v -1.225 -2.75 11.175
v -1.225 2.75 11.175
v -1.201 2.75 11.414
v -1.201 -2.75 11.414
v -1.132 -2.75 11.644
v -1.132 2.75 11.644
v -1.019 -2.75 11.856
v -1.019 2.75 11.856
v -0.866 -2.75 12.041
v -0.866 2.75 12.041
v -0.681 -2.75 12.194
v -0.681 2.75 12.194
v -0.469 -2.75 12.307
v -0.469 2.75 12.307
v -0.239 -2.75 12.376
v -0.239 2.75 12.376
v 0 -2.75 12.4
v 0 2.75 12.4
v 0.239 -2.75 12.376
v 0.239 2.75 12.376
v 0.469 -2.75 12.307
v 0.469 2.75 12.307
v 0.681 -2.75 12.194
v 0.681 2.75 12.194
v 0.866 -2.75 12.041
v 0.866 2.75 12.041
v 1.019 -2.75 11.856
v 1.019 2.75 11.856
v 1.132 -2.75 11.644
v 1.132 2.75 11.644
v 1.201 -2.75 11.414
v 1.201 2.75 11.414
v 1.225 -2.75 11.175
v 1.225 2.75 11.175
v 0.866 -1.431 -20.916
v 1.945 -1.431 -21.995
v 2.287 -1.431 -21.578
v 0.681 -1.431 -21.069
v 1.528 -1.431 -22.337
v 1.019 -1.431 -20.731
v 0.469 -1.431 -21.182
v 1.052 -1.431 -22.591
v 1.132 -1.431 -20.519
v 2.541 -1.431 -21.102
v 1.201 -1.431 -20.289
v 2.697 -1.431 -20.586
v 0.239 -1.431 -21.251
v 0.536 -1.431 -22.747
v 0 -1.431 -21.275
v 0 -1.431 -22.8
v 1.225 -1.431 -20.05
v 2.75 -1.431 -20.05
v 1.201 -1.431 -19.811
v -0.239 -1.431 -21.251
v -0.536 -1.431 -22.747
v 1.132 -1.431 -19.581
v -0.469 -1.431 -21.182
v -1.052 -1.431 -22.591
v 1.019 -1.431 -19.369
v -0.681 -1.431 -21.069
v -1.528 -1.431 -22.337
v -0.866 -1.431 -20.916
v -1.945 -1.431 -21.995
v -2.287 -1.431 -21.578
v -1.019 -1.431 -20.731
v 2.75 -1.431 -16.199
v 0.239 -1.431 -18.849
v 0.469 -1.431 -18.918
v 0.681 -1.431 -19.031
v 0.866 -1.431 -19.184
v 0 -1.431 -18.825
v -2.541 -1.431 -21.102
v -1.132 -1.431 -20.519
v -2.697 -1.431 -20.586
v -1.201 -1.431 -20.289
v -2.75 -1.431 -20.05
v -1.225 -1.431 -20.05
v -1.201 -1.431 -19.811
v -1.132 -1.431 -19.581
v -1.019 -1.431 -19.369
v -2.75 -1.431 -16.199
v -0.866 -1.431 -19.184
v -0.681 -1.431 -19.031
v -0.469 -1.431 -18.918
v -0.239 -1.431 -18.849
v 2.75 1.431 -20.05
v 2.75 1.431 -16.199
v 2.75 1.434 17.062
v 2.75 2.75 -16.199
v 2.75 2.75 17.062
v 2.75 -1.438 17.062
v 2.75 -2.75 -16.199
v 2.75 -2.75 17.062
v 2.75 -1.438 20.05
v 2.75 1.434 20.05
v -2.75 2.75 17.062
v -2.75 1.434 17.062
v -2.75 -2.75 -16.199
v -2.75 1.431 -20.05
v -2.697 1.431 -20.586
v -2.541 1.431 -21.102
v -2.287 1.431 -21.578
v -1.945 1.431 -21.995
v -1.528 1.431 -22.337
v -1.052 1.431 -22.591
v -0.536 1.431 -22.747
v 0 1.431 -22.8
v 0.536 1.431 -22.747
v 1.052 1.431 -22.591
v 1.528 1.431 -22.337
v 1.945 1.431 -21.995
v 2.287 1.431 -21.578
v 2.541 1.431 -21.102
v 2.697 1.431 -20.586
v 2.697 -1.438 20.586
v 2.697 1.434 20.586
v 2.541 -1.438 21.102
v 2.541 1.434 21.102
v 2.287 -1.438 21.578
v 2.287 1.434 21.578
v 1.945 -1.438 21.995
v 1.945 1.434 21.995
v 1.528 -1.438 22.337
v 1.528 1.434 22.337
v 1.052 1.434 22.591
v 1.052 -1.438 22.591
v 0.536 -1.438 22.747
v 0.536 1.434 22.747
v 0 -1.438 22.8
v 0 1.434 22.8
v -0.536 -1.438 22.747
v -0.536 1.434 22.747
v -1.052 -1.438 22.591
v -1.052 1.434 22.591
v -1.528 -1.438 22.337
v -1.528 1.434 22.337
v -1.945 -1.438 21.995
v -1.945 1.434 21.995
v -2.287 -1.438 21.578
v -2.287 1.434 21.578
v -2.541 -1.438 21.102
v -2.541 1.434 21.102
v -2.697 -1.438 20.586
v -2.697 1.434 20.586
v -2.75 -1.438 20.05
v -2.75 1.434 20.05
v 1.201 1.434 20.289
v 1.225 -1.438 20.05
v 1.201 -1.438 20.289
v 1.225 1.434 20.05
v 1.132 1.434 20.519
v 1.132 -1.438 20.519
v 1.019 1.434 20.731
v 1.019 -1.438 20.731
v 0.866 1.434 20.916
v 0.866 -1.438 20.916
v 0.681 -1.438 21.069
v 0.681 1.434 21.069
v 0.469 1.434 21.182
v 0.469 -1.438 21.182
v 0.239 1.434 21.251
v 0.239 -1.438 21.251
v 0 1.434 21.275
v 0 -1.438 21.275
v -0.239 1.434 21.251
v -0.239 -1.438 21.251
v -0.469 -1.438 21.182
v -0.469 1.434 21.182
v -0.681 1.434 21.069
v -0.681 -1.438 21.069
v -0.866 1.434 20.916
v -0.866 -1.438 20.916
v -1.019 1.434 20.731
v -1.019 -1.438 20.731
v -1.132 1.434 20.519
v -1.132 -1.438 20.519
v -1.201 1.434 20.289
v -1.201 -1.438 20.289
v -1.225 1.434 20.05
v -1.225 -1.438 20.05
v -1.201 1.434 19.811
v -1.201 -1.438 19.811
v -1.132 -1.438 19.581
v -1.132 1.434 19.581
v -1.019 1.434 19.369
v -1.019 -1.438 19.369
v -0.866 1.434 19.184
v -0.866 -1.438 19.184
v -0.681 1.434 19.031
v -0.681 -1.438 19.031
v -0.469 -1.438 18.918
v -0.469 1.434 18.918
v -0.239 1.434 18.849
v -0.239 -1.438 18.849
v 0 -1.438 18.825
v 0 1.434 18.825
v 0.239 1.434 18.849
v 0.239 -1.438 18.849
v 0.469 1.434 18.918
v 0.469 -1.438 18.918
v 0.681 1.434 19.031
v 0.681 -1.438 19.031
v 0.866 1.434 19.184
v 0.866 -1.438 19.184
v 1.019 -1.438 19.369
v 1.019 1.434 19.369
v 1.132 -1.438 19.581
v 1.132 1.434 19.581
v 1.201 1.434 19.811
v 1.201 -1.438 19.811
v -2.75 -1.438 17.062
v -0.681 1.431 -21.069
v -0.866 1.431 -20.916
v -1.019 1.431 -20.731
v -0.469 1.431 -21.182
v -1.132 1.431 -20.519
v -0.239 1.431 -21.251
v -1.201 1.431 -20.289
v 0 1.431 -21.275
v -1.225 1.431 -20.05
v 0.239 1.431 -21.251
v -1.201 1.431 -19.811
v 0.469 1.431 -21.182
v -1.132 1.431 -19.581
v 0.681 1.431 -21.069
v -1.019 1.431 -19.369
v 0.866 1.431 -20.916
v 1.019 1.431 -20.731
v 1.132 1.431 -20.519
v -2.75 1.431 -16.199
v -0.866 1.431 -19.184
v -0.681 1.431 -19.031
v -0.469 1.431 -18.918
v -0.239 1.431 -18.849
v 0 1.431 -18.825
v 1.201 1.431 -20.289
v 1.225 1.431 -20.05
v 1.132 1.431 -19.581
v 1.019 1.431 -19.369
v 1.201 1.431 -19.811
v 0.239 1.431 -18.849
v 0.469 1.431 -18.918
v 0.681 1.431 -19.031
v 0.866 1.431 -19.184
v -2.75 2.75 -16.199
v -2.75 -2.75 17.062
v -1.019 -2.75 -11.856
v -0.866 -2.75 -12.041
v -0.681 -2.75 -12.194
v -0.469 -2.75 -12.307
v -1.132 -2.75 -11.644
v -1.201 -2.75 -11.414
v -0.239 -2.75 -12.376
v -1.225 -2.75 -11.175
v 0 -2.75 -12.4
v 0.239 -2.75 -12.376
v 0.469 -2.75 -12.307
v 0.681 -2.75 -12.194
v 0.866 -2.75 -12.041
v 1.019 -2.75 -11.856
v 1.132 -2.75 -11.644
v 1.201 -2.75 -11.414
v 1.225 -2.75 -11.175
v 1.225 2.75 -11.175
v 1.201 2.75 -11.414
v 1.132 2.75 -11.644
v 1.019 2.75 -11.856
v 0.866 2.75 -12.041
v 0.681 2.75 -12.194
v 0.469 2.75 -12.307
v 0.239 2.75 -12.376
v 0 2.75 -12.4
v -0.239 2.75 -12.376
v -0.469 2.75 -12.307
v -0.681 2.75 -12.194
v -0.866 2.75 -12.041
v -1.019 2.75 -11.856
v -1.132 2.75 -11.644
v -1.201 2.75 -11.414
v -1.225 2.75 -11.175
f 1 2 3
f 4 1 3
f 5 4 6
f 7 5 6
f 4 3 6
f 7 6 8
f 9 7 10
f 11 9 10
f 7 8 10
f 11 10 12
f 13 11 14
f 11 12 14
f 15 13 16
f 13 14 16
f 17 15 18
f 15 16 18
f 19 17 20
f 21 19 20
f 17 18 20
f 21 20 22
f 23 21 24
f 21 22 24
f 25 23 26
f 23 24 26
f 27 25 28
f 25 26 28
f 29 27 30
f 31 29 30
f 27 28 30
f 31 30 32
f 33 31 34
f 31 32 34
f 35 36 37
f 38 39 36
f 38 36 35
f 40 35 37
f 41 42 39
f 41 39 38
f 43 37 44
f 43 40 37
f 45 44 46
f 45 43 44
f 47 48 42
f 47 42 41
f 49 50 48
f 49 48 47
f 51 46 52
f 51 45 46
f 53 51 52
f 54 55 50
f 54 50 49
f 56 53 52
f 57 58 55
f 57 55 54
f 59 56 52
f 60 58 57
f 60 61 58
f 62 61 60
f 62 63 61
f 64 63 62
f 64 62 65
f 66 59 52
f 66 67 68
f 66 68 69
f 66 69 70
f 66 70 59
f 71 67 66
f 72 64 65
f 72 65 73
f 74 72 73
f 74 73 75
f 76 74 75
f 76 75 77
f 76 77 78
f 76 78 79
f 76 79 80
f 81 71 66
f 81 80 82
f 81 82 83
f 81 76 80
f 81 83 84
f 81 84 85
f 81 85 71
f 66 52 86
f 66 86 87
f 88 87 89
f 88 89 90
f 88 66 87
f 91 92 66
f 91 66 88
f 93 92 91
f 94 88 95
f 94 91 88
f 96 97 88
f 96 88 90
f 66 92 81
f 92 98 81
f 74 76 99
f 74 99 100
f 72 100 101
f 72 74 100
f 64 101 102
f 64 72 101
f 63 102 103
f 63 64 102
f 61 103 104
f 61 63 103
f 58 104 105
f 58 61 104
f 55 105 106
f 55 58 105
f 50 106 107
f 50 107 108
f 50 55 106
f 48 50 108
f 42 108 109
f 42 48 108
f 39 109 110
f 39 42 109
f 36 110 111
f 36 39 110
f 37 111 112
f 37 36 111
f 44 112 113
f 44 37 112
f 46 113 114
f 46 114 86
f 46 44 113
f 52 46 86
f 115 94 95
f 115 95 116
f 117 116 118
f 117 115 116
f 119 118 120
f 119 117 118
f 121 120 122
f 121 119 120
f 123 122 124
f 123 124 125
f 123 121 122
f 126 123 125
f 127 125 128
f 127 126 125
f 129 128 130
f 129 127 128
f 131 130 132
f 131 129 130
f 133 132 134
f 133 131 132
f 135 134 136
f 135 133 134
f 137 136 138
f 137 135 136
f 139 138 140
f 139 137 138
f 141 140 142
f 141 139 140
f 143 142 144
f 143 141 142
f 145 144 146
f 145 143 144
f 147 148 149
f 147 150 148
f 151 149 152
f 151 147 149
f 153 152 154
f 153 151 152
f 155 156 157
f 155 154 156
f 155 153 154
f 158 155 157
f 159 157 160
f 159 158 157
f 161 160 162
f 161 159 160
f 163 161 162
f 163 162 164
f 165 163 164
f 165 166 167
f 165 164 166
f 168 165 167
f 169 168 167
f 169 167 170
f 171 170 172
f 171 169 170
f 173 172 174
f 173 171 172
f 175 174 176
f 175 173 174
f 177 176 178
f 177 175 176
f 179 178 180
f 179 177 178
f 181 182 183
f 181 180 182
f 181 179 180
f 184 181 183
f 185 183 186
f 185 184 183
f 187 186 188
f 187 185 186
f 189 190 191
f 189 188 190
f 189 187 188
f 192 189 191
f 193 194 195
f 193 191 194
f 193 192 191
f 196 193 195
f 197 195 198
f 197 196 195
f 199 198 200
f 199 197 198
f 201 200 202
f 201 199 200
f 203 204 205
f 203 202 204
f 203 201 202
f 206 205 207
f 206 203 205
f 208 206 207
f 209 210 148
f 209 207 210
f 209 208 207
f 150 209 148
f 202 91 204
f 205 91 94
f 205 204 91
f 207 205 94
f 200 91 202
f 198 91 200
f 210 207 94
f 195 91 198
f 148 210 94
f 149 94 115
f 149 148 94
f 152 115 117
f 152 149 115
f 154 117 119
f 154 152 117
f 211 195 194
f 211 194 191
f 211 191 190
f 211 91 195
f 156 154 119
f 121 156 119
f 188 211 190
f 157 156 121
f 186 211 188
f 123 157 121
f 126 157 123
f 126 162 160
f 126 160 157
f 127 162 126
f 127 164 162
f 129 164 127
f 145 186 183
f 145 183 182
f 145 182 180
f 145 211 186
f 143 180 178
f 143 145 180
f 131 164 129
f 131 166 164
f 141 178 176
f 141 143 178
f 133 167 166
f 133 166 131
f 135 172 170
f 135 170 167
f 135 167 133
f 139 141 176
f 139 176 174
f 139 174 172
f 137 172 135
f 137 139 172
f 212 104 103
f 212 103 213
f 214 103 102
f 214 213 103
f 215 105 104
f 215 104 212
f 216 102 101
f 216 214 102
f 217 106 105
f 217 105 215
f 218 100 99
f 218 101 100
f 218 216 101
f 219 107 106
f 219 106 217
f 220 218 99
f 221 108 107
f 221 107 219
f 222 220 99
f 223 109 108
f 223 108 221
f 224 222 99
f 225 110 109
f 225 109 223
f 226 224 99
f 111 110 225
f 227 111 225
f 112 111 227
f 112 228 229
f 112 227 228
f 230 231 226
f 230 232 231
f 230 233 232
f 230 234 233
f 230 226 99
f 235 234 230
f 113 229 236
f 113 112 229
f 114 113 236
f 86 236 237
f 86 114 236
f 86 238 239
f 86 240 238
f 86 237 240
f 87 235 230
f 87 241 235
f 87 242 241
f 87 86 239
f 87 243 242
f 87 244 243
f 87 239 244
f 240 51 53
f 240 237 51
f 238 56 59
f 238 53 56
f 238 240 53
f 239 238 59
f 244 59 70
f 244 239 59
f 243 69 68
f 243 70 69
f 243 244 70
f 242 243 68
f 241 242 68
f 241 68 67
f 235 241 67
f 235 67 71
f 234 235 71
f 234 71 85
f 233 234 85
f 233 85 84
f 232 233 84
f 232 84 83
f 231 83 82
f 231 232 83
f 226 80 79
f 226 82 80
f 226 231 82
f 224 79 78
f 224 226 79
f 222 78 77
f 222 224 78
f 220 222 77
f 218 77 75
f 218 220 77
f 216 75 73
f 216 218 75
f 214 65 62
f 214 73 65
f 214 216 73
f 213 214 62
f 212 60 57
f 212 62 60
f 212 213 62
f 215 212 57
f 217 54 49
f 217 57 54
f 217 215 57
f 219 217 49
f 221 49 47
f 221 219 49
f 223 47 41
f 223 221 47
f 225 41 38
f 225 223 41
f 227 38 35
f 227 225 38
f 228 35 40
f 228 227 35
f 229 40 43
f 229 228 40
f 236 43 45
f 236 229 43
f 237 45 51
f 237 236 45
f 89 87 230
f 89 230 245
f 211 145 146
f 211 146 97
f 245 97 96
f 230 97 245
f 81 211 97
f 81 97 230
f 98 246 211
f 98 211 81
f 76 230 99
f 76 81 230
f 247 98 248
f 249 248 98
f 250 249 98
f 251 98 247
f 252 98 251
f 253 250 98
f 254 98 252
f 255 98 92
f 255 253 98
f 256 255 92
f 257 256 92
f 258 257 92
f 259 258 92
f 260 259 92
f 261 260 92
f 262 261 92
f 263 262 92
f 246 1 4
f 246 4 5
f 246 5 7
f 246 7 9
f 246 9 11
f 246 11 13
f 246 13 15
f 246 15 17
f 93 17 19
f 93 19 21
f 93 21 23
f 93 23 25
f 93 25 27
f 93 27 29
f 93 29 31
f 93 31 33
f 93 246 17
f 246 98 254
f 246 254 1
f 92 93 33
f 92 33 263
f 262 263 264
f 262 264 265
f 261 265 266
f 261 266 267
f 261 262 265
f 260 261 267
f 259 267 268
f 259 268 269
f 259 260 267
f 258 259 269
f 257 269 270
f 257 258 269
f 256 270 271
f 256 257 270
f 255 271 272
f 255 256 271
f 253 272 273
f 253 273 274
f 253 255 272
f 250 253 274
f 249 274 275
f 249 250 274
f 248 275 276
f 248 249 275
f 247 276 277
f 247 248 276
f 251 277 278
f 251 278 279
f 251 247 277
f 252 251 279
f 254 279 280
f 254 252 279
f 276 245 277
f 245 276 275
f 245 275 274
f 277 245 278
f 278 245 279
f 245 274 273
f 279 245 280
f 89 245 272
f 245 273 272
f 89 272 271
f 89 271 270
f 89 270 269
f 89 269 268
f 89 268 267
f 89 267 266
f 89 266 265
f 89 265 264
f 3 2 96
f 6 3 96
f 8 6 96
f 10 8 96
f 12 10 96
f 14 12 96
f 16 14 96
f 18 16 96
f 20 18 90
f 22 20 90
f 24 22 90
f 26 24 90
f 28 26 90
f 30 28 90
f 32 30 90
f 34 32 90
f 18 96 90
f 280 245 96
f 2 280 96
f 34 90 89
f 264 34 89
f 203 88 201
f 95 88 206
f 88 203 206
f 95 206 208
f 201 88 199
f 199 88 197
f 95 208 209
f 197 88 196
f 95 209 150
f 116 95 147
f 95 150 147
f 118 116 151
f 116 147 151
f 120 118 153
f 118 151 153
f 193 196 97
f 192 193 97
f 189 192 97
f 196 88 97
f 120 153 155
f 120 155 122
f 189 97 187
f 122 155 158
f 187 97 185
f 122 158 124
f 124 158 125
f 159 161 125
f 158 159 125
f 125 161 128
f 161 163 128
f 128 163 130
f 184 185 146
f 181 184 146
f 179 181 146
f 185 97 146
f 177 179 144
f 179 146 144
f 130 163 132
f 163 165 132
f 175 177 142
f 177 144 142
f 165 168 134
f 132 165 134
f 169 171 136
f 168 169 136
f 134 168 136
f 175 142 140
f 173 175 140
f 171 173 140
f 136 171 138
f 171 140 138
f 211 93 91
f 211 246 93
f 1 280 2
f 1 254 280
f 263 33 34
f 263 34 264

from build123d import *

# Parameters (mm, degrees)
F0_R     = 1.225
F1_DEPTH = 2.75
F2_DEPTH = 25
F3_W     = 2.7319499059
F3_H     = 6.5613500774
F3_W_2   = 2.5918500032
F3_W_3   = 2.8168536527
F3_H_2   = 7.1630705833
F3_W_4   = 2.5843745833
F4_DEPTH = 5


with BuildPart() as f1:
    # F0 (on Front) → F1 (new body, symmetric)
    with BuildSketch(Plane.XZ):
        with BuildLine():
            ThreePointArc((-2.75, -20.05), (0, -22.8), (2.75, -20.05))
            Line((2.75, -20.05), (2.75, 20.05))
            ThreePointArc((2.75, 20.05), (0, 22.8), (-2.75, 20.05))
            Line((-2.75, 20.05), (-2.75, -20.05))
        make_face()
        with Locations((0, -20.05)):
            Circle(F0_R, mode=Mode.SUBTRACT)
        with BuildLine():
            Line((-1.225, -11.175), (-1.225, 11.175))
            ThreePointArc((-1.225, 11.175), (0, 12.4), (1.225, 11.175))
            Line((1.225, 11.175), (1.225, -11.175))
            ThreePointArc((1.225, -11.175), (0, -12.4), (-1.225, -11.175))
        make_face(mode=Mode.SUBTRACT)
        with Locations((0, 20.05)):
            Circle(F0_R, mode=Mode.SUBTRACT)
    extrude(amount=F1_DEPTH, both=True)

    # F0 (on Front) → F2 (cut)
    with BuildSketch(Plane.XZ):
        with Locations((0, 20.05)):
            Circle(F0_R)
        with BuildLine():
            ThreePointArc((1.225, 11.175), (0, 12.4), (-1.225, 11.175))
            Line((-1.225, 11.175), (-1.225, -11.175))
            ThreePointArc((-1.225, -11.175), (0, -12.4), (1.225, -11.175))
            Line((1.225, -11.175), (1.225, 11.175))
        make_face()
        with Locations((0, -20.05)):
            Circle(F0_R)
    extrude(amount=-F2_DEPTH, mode=Mode.SUBTRACT)

    # F3 (on Right) → F4 (cut, symmetric)
    with BuildSketch(Plane.YZ):
        with Locations((-2.8040870675, 20.3422307968)):
            Rectangle(F3_W, F3_H)
        with Locations((2.7298625791, 20.3422307968)):
            Rectangle(F3_W_2, F3_H)
        with Locations((-2.8399268263, -19.7806989431)):
            Rectangle(F3_W_3, F3_H_2)
        with Locations((2.7236872916, -19.7806989431)):
            Rectangle(F3_W_4, F3_H_2)
    extrude(amount=F4_DEPTH, both=True, mode=Mode.SUBTRACT)


solid = f1.part
